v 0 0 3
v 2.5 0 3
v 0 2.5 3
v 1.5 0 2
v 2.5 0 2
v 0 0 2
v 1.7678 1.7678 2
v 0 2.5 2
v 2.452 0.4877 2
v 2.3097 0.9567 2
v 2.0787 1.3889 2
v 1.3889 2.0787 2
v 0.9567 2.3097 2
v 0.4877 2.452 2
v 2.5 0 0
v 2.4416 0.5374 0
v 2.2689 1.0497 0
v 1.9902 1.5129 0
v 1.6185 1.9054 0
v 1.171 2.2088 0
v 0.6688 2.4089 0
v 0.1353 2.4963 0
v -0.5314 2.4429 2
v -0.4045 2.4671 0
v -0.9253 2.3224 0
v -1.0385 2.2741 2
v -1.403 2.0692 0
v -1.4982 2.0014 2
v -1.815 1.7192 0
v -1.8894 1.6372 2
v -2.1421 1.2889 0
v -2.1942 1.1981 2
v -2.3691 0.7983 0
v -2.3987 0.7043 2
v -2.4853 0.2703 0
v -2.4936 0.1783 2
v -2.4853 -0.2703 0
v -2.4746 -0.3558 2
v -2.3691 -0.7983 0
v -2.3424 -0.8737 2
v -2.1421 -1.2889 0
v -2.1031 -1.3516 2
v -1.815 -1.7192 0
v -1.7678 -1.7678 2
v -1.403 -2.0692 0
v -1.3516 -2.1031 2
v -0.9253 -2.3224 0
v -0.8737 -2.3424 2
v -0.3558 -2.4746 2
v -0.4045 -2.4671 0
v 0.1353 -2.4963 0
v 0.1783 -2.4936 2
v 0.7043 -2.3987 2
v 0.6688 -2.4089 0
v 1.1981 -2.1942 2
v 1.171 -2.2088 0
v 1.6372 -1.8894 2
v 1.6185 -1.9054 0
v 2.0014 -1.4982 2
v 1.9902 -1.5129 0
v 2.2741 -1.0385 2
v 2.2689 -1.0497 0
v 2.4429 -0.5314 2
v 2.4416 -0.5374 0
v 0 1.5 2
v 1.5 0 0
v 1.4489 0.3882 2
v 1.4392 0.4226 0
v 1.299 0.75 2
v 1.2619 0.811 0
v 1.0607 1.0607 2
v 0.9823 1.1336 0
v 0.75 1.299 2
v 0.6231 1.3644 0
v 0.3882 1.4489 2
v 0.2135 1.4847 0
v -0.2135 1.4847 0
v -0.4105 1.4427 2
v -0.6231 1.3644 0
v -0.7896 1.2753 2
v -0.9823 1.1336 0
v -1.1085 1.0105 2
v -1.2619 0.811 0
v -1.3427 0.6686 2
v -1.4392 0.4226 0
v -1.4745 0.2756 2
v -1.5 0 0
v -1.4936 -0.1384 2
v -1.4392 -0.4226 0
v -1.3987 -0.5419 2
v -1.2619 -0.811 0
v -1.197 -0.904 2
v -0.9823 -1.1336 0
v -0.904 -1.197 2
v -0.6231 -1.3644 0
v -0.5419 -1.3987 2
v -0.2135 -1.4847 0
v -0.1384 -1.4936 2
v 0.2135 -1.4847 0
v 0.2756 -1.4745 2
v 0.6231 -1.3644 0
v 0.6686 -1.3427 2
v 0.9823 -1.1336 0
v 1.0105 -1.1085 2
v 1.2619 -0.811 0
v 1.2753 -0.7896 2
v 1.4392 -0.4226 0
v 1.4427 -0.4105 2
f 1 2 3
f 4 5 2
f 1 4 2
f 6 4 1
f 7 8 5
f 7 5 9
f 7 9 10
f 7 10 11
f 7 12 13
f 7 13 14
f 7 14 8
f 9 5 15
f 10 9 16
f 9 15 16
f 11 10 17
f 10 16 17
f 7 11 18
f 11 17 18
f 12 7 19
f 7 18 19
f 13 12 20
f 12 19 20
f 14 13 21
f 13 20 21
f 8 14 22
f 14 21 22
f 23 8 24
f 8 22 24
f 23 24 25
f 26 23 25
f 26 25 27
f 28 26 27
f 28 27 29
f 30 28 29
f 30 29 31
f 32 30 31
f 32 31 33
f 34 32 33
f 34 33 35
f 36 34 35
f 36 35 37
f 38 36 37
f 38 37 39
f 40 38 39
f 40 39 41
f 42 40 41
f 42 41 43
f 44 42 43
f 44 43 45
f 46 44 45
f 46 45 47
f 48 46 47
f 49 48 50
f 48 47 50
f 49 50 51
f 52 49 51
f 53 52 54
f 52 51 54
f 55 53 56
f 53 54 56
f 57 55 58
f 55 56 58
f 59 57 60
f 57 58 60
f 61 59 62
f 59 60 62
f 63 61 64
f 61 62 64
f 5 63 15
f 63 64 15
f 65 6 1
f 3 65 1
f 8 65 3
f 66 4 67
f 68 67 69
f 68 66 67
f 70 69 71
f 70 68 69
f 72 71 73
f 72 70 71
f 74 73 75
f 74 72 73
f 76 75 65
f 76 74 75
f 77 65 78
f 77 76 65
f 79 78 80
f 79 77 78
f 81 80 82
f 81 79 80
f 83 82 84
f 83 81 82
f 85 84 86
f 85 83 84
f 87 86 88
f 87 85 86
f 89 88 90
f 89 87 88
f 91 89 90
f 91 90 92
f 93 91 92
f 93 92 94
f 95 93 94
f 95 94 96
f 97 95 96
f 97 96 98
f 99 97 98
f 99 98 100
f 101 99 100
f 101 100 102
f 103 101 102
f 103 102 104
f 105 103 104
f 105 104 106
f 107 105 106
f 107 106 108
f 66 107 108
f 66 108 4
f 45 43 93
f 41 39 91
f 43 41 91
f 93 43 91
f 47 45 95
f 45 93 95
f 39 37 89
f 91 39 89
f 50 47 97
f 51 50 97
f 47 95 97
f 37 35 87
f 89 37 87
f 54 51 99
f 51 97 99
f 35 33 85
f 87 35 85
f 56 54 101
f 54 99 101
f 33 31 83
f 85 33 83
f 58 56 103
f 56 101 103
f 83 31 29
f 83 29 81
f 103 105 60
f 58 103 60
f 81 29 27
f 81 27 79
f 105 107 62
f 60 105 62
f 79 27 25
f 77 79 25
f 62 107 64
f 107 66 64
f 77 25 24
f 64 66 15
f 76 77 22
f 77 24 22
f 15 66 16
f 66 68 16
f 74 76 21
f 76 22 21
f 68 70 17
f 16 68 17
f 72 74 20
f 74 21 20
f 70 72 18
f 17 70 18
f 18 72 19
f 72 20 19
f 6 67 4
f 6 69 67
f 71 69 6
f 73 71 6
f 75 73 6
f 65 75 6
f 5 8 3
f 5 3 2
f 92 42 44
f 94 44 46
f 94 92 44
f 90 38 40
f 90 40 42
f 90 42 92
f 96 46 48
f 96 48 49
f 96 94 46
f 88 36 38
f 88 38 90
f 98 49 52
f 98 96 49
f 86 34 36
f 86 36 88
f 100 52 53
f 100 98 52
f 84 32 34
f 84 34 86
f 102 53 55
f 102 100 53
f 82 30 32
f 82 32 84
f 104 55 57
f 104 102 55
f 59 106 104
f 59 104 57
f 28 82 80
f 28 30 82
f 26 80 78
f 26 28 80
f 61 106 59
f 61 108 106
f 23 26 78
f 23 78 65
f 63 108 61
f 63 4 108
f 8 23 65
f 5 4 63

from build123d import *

# Parameters (mm, degrees)
ESQUISSE1_R        = 2.5
ESQUISSE1_R_2      = 1.5
BOSS_EXTRU_1_DEPTH = 2
BOSS_EXTRU_2_DEPTH = 1


with BuildPart() as part:
    # Esquisse1 → Boss.-Extru.1 (new body)
    with BuildSketch(Plane.XY):
        Circle(ESQUISSE1_R)
        Circle(ESQUISSE1_R_2, mode=Mode.SUBTRACT)
    extrude(amount=BOSS_EXTRU_1_DEPTH)

    # Esquisse2 → Boss.-Extru.2 (add)
    with BuildSketch(Plane.XY.offset(2)):
        Polygon((0, 0), (0, 2.5), (2.5, 0), align=None)
    extrude(amount=BOSS_EXTRU_2_DEPTH)


solid = part.part
